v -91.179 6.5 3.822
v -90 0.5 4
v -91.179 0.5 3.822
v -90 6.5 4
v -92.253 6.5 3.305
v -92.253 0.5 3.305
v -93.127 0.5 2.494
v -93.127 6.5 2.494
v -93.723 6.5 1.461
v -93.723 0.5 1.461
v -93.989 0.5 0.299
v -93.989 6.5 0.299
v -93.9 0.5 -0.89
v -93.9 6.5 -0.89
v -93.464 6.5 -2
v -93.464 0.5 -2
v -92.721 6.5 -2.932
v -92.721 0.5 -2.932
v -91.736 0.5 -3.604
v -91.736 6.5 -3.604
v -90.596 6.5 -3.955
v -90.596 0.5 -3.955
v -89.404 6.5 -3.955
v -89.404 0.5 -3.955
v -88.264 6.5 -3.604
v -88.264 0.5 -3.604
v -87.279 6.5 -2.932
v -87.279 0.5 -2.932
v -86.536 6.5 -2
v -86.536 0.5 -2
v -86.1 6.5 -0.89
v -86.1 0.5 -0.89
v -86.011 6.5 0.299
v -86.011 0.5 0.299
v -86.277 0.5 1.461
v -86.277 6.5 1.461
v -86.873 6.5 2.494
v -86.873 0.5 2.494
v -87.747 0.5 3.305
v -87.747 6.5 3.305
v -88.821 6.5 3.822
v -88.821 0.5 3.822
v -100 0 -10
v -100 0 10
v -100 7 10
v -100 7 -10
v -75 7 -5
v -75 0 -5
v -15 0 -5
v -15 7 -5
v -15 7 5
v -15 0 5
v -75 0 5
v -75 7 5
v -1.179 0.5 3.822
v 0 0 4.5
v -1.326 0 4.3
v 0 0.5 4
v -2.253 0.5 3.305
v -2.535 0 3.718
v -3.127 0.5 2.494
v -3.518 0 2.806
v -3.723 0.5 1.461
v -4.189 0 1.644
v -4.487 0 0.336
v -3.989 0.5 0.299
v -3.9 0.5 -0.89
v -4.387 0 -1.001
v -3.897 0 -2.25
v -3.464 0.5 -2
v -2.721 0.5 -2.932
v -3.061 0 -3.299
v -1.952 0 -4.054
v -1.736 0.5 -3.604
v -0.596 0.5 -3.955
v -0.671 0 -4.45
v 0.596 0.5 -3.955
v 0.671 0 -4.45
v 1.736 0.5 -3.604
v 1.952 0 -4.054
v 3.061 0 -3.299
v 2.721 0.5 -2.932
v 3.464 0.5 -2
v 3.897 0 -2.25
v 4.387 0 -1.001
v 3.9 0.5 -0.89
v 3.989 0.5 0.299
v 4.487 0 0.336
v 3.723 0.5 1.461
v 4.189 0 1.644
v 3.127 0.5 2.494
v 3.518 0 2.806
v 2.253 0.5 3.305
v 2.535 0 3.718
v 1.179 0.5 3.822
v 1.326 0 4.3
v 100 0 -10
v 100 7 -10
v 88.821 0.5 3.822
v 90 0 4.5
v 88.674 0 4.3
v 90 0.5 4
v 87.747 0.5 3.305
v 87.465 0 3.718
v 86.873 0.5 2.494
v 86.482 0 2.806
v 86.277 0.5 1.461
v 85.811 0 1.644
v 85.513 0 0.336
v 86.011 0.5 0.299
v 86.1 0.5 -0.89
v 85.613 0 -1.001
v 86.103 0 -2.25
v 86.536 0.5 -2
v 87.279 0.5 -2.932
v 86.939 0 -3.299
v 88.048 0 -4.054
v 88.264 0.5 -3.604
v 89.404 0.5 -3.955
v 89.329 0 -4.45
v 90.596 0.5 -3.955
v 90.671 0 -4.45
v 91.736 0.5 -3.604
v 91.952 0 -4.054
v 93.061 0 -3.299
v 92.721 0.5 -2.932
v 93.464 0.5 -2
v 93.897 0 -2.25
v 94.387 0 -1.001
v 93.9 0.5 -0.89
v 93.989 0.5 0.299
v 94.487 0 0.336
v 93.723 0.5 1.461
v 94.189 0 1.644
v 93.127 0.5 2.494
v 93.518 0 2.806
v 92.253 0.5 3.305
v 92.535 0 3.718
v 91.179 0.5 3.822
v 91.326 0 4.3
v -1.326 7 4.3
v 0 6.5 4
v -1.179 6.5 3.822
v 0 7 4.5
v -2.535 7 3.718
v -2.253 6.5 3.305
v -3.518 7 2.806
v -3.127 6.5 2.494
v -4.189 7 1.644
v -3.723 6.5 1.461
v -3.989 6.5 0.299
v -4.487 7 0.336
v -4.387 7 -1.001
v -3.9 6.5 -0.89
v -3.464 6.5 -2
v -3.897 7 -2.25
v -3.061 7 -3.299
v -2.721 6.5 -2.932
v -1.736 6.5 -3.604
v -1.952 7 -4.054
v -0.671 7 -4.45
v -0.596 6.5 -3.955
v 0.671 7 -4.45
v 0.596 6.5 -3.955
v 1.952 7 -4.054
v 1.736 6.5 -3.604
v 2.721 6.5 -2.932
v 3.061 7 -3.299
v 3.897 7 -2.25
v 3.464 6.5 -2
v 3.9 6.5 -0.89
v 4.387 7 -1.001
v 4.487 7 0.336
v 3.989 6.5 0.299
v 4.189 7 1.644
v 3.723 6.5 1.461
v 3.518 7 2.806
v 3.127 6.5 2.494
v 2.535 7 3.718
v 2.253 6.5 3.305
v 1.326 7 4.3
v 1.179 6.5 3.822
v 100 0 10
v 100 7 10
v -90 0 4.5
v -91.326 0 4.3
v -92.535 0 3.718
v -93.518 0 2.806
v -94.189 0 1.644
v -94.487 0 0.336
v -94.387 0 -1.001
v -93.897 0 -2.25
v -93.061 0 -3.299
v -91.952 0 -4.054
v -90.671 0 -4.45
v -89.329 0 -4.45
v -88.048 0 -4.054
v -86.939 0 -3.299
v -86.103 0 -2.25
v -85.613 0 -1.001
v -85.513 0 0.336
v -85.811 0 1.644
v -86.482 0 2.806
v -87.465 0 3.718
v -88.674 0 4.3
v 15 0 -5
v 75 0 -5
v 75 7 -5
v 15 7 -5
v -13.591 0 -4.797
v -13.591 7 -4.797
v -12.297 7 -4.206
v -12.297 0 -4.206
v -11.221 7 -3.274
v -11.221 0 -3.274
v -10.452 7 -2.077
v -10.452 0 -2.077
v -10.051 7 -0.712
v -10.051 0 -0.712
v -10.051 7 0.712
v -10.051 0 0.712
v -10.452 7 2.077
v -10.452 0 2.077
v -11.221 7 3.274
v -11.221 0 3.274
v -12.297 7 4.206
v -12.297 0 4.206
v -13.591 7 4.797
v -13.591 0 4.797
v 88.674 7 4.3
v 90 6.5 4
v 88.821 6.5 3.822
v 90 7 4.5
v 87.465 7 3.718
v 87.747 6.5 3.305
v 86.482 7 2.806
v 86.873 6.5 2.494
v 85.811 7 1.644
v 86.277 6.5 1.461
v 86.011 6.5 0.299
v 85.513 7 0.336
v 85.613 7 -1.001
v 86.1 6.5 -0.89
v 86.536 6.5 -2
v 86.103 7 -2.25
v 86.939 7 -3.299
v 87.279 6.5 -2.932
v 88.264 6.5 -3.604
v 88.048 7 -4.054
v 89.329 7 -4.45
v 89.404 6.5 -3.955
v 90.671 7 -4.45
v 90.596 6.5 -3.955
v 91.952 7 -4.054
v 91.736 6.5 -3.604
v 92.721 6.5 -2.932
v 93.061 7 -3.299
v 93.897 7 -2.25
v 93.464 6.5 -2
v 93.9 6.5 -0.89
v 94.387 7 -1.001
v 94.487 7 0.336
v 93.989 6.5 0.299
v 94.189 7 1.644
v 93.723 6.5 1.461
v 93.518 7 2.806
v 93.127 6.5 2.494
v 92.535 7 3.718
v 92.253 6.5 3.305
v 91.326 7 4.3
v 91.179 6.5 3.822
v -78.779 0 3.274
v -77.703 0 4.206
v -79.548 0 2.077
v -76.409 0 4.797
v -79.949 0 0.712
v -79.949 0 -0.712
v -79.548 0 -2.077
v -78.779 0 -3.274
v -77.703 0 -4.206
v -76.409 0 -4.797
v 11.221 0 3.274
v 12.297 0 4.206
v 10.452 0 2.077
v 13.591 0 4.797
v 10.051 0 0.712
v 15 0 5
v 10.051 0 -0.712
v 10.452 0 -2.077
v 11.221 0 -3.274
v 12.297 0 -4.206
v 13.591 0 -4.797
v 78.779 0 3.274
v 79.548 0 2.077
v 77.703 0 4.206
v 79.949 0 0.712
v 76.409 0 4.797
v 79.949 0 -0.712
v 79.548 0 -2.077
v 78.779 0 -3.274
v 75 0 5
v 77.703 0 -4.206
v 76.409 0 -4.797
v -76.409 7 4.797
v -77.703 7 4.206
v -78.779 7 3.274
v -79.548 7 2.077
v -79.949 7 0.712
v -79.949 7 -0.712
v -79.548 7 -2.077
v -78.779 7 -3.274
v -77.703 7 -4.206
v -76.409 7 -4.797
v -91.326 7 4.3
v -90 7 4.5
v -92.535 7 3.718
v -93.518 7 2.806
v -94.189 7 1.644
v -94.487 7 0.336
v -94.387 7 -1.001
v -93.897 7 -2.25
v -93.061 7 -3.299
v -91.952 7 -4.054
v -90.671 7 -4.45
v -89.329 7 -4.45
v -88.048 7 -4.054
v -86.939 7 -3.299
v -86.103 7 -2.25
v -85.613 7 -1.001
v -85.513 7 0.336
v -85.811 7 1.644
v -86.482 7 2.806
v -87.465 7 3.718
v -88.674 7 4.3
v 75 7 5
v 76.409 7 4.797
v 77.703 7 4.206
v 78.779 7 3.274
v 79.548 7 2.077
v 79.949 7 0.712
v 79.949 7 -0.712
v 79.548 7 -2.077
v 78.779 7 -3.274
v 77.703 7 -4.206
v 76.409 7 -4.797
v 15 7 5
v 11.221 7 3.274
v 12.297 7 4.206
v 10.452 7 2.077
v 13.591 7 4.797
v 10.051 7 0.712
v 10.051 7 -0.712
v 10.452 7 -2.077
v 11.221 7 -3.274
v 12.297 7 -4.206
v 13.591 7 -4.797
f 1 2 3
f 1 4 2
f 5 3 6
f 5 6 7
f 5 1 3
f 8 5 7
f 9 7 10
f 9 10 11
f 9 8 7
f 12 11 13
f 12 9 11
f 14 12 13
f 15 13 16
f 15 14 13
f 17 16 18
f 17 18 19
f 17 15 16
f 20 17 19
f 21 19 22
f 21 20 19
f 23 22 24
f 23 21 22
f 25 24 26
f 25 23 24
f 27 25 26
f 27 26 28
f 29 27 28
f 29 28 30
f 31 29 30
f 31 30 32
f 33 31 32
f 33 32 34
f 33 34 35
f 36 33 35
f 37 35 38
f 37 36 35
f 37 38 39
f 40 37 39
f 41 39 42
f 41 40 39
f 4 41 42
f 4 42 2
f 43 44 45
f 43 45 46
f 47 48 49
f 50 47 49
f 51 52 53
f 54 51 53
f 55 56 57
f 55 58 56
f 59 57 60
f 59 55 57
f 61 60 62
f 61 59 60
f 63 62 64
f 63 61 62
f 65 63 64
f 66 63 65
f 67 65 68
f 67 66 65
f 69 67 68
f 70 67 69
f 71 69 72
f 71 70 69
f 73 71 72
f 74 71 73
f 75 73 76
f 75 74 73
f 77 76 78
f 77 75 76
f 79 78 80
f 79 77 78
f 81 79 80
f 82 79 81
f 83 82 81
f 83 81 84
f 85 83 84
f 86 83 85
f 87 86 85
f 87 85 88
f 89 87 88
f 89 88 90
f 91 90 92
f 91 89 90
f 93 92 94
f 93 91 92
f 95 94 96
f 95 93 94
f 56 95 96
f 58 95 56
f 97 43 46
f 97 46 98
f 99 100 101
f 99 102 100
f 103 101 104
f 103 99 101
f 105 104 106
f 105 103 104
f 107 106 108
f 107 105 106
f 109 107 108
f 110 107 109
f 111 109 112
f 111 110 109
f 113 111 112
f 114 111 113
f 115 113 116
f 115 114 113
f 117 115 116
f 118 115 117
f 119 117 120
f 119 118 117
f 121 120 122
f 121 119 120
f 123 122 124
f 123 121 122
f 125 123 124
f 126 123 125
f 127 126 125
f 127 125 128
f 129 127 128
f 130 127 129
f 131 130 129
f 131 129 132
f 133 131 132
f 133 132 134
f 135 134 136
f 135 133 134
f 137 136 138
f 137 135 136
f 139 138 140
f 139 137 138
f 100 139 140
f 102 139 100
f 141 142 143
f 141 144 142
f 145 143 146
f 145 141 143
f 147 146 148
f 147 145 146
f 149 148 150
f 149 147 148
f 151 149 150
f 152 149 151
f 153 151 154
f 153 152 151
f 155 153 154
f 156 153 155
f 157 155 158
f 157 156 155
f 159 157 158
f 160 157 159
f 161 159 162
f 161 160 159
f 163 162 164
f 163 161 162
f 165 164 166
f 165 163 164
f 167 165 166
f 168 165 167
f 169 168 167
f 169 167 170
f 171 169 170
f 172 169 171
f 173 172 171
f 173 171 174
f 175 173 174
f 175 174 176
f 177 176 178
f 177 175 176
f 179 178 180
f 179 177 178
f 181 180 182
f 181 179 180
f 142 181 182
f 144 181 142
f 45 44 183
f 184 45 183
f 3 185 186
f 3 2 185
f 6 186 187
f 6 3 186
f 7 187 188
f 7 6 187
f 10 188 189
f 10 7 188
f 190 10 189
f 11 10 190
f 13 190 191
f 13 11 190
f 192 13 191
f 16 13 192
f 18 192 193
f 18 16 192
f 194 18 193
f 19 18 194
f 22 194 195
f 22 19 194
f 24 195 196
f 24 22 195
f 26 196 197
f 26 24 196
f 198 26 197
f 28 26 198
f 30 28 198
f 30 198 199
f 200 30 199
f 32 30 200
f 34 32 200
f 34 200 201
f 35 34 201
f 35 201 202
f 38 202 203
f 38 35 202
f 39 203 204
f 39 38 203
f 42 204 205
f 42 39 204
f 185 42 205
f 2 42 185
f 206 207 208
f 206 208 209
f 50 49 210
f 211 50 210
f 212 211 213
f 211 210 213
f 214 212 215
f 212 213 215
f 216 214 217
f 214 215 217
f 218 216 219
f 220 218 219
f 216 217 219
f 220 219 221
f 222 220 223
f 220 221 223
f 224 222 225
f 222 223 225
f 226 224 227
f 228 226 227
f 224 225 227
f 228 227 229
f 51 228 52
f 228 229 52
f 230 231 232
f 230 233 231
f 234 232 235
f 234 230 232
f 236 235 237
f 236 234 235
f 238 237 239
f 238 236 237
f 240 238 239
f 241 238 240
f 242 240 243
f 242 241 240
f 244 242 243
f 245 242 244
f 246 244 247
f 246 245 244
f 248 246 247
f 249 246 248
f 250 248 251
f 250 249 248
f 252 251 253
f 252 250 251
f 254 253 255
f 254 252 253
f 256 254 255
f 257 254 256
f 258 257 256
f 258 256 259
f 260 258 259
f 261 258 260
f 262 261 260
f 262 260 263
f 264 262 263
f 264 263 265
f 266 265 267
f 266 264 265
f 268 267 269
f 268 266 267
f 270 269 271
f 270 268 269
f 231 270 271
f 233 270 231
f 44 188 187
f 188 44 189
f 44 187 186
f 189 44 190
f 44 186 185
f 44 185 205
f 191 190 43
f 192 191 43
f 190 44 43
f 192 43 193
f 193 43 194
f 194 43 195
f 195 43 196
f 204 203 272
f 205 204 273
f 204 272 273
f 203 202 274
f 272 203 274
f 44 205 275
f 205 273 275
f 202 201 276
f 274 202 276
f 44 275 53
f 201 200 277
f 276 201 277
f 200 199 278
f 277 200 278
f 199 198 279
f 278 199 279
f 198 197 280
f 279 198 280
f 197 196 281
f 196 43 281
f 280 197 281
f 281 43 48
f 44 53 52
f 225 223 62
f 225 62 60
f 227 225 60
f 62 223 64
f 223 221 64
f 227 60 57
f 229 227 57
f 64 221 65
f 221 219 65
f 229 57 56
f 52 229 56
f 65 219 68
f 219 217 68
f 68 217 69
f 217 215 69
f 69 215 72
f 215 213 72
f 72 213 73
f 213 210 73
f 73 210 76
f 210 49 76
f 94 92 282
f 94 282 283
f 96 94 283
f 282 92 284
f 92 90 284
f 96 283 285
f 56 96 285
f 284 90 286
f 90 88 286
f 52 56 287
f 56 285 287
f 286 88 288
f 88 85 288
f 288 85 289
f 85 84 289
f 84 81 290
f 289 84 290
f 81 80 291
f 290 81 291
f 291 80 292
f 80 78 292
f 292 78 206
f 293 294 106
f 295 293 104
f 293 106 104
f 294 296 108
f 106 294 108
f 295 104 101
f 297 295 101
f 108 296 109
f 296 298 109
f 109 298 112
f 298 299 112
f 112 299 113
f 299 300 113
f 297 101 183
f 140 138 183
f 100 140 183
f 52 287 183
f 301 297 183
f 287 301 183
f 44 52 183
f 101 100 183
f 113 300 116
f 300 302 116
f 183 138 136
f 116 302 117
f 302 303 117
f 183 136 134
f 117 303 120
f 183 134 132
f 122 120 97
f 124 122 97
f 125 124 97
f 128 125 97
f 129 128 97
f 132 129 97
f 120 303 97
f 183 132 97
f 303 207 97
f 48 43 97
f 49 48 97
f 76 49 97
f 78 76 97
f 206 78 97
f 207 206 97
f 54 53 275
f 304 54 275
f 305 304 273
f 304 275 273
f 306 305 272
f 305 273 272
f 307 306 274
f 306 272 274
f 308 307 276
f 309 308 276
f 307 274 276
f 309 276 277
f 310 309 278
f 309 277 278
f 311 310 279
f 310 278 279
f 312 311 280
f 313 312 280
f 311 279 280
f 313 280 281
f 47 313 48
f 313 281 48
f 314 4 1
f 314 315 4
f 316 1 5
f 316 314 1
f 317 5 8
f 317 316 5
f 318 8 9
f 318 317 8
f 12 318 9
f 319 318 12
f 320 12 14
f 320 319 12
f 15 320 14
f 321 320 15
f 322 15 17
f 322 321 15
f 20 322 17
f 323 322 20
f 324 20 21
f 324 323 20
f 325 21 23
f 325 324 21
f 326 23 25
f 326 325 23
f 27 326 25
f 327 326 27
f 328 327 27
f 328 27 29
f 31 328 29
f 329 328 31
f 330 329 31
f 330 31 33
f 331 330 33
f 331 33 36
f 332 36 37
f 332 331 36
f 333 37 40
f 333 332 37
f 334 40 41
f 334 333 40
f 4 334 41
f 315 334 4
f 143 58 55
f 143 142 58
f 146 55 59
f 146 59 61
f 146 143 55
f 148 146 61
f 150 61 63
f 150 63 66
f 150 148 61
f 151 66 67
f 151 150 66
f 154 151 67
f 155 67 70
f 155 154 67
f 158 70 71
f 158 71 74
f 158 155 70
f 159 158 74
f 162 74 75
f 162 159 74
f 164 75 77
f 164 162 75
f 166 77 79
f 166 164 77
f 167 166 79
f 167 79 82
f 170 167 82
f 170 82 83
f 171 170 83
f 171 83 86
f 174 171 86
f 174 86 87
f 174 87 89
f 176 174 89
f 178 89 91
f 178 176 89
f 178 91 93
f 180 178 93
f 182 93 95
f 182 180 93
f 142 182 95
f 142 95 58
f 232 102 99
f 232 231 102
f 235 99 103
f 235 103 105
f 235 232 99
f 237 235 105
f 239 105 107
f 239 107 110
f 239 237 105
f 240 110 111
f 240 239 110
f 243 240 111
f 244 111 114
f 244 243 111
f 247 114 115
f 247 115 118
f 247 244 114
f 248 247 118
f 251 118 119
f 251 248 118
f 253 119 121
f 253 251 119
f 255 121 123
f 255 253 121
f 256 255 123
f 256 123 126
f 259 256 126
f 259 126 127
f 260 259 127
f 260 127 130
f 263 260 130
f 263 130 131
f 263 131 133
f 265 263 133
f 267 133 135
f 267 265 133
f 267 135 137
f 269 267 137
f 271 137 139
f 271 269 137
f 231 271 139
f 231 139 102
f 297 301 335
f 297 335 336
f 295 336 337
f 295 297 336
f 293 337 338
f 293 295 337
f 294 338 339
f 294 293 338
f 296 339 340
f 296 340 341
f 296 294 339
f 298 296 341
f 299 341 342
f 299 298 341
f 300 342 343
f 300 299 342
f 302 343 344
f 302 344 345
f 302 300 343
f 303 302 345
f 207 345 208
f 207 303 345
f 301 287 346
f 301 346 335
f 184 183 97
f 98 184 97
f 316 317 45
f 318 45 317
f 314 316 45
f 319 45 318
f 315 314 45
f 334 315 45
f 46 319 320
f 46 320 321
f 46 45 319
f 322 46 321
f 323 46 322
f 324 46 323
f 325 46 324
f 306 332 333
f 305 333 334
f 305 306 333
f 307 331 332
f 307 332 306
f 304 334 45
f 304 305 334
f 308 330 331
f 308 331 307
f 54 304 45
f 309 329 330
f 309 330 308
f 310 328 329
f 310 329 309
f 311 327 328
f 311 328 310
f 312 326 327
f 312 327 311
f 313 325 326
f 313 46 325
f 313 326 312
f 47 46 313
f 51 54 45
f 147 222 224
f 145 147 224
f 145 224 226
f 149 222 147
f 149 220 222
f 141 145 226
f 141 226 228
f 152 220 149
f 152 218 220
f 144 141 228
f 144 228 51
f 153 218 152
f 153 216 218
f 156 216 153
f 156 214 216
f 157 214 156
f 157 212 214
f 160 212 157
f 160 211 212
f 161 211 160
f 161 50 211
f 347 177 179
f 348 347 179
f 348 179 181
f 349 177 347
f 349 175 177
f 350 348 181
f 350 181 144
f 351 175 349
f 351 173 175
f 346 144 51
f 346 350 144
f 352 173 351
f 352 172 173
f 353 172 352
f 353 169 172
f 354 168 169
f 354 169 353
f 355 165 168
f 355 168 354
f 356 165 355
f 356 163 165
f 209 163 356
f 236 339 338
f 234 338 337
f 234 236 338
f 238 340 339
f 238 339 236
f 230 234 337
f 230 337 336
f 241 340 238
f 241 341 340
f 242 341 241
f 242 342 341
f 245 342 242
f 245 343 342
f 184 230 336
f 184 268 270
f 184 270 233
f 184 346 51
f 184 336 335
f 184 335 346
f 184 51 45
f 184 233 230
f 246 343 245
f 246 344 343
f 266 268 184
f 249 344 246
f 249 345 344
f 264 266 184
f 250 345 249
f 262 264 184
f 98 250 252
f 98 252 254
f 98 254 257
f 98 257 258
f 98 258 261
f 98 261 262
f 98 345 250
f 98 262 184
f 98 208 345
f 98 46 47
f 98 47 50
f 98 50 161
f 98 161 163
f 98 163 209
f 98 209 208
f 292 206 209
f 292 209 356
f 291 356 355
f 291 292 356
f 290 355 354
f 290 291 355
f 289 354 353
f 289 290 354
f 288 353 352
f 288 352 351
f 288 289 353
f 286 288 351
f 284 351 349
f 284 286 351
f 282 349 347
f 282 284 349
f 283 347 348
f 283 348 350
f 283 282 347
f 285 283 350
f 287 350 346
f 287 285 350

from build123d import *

# Parameters (mm, degrees)
SZKIC1_W                            = 200
SZKIC1_H                            = 20
DODANIE_WYCI_GNI_CIE1_DEPTH         = 7
OTWORY_USTALAJ_CE_8_0MM1_AT_2_COUNT = 2
OTWORY_USTALAJ_CE_8_0MM1_AT_2_PITCH = 90
OTWORY_USTALAJ_CE_8_0MM1_AT_3_COUNT = 2
OTWORY_USTALAJ_CE_8_0MM1_AT_3_PITCH = 180


with BuildPart() as part:
    # Szkic1 → Dodanie-wyciągnięcie1 (new body)
    with BuildSketch(Plane(origin=(0, 0, 0), x_dir=(1, 0, 0), z_dir=(0, 1, 0))):
        Rectangle(SZKIC1_W, SZKIC1_H)
        with BuildLine():
            Line((-75, 5), (-15, 5))
            ThreePointArc((-15, 5), (-10, 0), (-15, -5))
            Line((-15, -5), (-75, -5))
            ThreePointArc((-75, -5), (-80, 0), (-75, 5))
        make_face(mode=Mode.SUBTRACT)
        with BuildLine():
            Line((75, 5), (15, 5))
            ThreePointArc((15, 5), (10, 0), (15, -5))
            Line((15, -5), (75, -5))
            ThreePointArc((75, -5), (80, 0), (75, 5))
        make_face(mode=Mode.SUBTRACT)
    extrude(amount=DODANIE_WYCI_GNI_CIE1_DEPTH)

    # Szkic4 → Otwory ustalające Ø8.0mm1 (revolve, cut)
    with BuildSketch(Plane(origin=(-90, 7, 0), x_dir=(0, 0, 1), z_dir=(1, 0, 0))):
        Polygon((0, 0), (0, 7), (4.5, 7), (4, 6.5), (4, 0.5), (4.5, 0), align=None)
    otwory_ustalaj_ce_8_0mm1 = revolve(axis=Axis((-90, 13.35, 0), (0, -1, 0)), mode=Mode.SUBTRACT)

    # Otwory ustalające Ø8.0mm1 at 2: Otwory ustalające Ø8.0mm1 ×2
    with Locations(*[(i * OTWORY_USTALAJ_CE_8_0MM1_AT_2_PITCH, 0, 0) for i in range(1, OTWORY_USTALAJ_CE_8_0MM1_AT_2_COUNT)]):
        add(otwory_ustalaj_ce_8_0mm1, mode=Mode.SUBTRACT)

    # Otwory ustalające Ø8.0mm1 at 3: Otwory ustalające Ø8.0mm1 ×2
    with Locations(*[(i * OTWORY_USTALAJ_CE_8_0MM1_AT_3_PITCH, 0, 0) for i in range(1, OTWORY_USTALAJ_CE_8_0MM1_AT_3_COUNT)]):
        add(otwory_ustalaj_ce_8_0mm1, mode=Mode.SUBTRACT)


solid = part.part
